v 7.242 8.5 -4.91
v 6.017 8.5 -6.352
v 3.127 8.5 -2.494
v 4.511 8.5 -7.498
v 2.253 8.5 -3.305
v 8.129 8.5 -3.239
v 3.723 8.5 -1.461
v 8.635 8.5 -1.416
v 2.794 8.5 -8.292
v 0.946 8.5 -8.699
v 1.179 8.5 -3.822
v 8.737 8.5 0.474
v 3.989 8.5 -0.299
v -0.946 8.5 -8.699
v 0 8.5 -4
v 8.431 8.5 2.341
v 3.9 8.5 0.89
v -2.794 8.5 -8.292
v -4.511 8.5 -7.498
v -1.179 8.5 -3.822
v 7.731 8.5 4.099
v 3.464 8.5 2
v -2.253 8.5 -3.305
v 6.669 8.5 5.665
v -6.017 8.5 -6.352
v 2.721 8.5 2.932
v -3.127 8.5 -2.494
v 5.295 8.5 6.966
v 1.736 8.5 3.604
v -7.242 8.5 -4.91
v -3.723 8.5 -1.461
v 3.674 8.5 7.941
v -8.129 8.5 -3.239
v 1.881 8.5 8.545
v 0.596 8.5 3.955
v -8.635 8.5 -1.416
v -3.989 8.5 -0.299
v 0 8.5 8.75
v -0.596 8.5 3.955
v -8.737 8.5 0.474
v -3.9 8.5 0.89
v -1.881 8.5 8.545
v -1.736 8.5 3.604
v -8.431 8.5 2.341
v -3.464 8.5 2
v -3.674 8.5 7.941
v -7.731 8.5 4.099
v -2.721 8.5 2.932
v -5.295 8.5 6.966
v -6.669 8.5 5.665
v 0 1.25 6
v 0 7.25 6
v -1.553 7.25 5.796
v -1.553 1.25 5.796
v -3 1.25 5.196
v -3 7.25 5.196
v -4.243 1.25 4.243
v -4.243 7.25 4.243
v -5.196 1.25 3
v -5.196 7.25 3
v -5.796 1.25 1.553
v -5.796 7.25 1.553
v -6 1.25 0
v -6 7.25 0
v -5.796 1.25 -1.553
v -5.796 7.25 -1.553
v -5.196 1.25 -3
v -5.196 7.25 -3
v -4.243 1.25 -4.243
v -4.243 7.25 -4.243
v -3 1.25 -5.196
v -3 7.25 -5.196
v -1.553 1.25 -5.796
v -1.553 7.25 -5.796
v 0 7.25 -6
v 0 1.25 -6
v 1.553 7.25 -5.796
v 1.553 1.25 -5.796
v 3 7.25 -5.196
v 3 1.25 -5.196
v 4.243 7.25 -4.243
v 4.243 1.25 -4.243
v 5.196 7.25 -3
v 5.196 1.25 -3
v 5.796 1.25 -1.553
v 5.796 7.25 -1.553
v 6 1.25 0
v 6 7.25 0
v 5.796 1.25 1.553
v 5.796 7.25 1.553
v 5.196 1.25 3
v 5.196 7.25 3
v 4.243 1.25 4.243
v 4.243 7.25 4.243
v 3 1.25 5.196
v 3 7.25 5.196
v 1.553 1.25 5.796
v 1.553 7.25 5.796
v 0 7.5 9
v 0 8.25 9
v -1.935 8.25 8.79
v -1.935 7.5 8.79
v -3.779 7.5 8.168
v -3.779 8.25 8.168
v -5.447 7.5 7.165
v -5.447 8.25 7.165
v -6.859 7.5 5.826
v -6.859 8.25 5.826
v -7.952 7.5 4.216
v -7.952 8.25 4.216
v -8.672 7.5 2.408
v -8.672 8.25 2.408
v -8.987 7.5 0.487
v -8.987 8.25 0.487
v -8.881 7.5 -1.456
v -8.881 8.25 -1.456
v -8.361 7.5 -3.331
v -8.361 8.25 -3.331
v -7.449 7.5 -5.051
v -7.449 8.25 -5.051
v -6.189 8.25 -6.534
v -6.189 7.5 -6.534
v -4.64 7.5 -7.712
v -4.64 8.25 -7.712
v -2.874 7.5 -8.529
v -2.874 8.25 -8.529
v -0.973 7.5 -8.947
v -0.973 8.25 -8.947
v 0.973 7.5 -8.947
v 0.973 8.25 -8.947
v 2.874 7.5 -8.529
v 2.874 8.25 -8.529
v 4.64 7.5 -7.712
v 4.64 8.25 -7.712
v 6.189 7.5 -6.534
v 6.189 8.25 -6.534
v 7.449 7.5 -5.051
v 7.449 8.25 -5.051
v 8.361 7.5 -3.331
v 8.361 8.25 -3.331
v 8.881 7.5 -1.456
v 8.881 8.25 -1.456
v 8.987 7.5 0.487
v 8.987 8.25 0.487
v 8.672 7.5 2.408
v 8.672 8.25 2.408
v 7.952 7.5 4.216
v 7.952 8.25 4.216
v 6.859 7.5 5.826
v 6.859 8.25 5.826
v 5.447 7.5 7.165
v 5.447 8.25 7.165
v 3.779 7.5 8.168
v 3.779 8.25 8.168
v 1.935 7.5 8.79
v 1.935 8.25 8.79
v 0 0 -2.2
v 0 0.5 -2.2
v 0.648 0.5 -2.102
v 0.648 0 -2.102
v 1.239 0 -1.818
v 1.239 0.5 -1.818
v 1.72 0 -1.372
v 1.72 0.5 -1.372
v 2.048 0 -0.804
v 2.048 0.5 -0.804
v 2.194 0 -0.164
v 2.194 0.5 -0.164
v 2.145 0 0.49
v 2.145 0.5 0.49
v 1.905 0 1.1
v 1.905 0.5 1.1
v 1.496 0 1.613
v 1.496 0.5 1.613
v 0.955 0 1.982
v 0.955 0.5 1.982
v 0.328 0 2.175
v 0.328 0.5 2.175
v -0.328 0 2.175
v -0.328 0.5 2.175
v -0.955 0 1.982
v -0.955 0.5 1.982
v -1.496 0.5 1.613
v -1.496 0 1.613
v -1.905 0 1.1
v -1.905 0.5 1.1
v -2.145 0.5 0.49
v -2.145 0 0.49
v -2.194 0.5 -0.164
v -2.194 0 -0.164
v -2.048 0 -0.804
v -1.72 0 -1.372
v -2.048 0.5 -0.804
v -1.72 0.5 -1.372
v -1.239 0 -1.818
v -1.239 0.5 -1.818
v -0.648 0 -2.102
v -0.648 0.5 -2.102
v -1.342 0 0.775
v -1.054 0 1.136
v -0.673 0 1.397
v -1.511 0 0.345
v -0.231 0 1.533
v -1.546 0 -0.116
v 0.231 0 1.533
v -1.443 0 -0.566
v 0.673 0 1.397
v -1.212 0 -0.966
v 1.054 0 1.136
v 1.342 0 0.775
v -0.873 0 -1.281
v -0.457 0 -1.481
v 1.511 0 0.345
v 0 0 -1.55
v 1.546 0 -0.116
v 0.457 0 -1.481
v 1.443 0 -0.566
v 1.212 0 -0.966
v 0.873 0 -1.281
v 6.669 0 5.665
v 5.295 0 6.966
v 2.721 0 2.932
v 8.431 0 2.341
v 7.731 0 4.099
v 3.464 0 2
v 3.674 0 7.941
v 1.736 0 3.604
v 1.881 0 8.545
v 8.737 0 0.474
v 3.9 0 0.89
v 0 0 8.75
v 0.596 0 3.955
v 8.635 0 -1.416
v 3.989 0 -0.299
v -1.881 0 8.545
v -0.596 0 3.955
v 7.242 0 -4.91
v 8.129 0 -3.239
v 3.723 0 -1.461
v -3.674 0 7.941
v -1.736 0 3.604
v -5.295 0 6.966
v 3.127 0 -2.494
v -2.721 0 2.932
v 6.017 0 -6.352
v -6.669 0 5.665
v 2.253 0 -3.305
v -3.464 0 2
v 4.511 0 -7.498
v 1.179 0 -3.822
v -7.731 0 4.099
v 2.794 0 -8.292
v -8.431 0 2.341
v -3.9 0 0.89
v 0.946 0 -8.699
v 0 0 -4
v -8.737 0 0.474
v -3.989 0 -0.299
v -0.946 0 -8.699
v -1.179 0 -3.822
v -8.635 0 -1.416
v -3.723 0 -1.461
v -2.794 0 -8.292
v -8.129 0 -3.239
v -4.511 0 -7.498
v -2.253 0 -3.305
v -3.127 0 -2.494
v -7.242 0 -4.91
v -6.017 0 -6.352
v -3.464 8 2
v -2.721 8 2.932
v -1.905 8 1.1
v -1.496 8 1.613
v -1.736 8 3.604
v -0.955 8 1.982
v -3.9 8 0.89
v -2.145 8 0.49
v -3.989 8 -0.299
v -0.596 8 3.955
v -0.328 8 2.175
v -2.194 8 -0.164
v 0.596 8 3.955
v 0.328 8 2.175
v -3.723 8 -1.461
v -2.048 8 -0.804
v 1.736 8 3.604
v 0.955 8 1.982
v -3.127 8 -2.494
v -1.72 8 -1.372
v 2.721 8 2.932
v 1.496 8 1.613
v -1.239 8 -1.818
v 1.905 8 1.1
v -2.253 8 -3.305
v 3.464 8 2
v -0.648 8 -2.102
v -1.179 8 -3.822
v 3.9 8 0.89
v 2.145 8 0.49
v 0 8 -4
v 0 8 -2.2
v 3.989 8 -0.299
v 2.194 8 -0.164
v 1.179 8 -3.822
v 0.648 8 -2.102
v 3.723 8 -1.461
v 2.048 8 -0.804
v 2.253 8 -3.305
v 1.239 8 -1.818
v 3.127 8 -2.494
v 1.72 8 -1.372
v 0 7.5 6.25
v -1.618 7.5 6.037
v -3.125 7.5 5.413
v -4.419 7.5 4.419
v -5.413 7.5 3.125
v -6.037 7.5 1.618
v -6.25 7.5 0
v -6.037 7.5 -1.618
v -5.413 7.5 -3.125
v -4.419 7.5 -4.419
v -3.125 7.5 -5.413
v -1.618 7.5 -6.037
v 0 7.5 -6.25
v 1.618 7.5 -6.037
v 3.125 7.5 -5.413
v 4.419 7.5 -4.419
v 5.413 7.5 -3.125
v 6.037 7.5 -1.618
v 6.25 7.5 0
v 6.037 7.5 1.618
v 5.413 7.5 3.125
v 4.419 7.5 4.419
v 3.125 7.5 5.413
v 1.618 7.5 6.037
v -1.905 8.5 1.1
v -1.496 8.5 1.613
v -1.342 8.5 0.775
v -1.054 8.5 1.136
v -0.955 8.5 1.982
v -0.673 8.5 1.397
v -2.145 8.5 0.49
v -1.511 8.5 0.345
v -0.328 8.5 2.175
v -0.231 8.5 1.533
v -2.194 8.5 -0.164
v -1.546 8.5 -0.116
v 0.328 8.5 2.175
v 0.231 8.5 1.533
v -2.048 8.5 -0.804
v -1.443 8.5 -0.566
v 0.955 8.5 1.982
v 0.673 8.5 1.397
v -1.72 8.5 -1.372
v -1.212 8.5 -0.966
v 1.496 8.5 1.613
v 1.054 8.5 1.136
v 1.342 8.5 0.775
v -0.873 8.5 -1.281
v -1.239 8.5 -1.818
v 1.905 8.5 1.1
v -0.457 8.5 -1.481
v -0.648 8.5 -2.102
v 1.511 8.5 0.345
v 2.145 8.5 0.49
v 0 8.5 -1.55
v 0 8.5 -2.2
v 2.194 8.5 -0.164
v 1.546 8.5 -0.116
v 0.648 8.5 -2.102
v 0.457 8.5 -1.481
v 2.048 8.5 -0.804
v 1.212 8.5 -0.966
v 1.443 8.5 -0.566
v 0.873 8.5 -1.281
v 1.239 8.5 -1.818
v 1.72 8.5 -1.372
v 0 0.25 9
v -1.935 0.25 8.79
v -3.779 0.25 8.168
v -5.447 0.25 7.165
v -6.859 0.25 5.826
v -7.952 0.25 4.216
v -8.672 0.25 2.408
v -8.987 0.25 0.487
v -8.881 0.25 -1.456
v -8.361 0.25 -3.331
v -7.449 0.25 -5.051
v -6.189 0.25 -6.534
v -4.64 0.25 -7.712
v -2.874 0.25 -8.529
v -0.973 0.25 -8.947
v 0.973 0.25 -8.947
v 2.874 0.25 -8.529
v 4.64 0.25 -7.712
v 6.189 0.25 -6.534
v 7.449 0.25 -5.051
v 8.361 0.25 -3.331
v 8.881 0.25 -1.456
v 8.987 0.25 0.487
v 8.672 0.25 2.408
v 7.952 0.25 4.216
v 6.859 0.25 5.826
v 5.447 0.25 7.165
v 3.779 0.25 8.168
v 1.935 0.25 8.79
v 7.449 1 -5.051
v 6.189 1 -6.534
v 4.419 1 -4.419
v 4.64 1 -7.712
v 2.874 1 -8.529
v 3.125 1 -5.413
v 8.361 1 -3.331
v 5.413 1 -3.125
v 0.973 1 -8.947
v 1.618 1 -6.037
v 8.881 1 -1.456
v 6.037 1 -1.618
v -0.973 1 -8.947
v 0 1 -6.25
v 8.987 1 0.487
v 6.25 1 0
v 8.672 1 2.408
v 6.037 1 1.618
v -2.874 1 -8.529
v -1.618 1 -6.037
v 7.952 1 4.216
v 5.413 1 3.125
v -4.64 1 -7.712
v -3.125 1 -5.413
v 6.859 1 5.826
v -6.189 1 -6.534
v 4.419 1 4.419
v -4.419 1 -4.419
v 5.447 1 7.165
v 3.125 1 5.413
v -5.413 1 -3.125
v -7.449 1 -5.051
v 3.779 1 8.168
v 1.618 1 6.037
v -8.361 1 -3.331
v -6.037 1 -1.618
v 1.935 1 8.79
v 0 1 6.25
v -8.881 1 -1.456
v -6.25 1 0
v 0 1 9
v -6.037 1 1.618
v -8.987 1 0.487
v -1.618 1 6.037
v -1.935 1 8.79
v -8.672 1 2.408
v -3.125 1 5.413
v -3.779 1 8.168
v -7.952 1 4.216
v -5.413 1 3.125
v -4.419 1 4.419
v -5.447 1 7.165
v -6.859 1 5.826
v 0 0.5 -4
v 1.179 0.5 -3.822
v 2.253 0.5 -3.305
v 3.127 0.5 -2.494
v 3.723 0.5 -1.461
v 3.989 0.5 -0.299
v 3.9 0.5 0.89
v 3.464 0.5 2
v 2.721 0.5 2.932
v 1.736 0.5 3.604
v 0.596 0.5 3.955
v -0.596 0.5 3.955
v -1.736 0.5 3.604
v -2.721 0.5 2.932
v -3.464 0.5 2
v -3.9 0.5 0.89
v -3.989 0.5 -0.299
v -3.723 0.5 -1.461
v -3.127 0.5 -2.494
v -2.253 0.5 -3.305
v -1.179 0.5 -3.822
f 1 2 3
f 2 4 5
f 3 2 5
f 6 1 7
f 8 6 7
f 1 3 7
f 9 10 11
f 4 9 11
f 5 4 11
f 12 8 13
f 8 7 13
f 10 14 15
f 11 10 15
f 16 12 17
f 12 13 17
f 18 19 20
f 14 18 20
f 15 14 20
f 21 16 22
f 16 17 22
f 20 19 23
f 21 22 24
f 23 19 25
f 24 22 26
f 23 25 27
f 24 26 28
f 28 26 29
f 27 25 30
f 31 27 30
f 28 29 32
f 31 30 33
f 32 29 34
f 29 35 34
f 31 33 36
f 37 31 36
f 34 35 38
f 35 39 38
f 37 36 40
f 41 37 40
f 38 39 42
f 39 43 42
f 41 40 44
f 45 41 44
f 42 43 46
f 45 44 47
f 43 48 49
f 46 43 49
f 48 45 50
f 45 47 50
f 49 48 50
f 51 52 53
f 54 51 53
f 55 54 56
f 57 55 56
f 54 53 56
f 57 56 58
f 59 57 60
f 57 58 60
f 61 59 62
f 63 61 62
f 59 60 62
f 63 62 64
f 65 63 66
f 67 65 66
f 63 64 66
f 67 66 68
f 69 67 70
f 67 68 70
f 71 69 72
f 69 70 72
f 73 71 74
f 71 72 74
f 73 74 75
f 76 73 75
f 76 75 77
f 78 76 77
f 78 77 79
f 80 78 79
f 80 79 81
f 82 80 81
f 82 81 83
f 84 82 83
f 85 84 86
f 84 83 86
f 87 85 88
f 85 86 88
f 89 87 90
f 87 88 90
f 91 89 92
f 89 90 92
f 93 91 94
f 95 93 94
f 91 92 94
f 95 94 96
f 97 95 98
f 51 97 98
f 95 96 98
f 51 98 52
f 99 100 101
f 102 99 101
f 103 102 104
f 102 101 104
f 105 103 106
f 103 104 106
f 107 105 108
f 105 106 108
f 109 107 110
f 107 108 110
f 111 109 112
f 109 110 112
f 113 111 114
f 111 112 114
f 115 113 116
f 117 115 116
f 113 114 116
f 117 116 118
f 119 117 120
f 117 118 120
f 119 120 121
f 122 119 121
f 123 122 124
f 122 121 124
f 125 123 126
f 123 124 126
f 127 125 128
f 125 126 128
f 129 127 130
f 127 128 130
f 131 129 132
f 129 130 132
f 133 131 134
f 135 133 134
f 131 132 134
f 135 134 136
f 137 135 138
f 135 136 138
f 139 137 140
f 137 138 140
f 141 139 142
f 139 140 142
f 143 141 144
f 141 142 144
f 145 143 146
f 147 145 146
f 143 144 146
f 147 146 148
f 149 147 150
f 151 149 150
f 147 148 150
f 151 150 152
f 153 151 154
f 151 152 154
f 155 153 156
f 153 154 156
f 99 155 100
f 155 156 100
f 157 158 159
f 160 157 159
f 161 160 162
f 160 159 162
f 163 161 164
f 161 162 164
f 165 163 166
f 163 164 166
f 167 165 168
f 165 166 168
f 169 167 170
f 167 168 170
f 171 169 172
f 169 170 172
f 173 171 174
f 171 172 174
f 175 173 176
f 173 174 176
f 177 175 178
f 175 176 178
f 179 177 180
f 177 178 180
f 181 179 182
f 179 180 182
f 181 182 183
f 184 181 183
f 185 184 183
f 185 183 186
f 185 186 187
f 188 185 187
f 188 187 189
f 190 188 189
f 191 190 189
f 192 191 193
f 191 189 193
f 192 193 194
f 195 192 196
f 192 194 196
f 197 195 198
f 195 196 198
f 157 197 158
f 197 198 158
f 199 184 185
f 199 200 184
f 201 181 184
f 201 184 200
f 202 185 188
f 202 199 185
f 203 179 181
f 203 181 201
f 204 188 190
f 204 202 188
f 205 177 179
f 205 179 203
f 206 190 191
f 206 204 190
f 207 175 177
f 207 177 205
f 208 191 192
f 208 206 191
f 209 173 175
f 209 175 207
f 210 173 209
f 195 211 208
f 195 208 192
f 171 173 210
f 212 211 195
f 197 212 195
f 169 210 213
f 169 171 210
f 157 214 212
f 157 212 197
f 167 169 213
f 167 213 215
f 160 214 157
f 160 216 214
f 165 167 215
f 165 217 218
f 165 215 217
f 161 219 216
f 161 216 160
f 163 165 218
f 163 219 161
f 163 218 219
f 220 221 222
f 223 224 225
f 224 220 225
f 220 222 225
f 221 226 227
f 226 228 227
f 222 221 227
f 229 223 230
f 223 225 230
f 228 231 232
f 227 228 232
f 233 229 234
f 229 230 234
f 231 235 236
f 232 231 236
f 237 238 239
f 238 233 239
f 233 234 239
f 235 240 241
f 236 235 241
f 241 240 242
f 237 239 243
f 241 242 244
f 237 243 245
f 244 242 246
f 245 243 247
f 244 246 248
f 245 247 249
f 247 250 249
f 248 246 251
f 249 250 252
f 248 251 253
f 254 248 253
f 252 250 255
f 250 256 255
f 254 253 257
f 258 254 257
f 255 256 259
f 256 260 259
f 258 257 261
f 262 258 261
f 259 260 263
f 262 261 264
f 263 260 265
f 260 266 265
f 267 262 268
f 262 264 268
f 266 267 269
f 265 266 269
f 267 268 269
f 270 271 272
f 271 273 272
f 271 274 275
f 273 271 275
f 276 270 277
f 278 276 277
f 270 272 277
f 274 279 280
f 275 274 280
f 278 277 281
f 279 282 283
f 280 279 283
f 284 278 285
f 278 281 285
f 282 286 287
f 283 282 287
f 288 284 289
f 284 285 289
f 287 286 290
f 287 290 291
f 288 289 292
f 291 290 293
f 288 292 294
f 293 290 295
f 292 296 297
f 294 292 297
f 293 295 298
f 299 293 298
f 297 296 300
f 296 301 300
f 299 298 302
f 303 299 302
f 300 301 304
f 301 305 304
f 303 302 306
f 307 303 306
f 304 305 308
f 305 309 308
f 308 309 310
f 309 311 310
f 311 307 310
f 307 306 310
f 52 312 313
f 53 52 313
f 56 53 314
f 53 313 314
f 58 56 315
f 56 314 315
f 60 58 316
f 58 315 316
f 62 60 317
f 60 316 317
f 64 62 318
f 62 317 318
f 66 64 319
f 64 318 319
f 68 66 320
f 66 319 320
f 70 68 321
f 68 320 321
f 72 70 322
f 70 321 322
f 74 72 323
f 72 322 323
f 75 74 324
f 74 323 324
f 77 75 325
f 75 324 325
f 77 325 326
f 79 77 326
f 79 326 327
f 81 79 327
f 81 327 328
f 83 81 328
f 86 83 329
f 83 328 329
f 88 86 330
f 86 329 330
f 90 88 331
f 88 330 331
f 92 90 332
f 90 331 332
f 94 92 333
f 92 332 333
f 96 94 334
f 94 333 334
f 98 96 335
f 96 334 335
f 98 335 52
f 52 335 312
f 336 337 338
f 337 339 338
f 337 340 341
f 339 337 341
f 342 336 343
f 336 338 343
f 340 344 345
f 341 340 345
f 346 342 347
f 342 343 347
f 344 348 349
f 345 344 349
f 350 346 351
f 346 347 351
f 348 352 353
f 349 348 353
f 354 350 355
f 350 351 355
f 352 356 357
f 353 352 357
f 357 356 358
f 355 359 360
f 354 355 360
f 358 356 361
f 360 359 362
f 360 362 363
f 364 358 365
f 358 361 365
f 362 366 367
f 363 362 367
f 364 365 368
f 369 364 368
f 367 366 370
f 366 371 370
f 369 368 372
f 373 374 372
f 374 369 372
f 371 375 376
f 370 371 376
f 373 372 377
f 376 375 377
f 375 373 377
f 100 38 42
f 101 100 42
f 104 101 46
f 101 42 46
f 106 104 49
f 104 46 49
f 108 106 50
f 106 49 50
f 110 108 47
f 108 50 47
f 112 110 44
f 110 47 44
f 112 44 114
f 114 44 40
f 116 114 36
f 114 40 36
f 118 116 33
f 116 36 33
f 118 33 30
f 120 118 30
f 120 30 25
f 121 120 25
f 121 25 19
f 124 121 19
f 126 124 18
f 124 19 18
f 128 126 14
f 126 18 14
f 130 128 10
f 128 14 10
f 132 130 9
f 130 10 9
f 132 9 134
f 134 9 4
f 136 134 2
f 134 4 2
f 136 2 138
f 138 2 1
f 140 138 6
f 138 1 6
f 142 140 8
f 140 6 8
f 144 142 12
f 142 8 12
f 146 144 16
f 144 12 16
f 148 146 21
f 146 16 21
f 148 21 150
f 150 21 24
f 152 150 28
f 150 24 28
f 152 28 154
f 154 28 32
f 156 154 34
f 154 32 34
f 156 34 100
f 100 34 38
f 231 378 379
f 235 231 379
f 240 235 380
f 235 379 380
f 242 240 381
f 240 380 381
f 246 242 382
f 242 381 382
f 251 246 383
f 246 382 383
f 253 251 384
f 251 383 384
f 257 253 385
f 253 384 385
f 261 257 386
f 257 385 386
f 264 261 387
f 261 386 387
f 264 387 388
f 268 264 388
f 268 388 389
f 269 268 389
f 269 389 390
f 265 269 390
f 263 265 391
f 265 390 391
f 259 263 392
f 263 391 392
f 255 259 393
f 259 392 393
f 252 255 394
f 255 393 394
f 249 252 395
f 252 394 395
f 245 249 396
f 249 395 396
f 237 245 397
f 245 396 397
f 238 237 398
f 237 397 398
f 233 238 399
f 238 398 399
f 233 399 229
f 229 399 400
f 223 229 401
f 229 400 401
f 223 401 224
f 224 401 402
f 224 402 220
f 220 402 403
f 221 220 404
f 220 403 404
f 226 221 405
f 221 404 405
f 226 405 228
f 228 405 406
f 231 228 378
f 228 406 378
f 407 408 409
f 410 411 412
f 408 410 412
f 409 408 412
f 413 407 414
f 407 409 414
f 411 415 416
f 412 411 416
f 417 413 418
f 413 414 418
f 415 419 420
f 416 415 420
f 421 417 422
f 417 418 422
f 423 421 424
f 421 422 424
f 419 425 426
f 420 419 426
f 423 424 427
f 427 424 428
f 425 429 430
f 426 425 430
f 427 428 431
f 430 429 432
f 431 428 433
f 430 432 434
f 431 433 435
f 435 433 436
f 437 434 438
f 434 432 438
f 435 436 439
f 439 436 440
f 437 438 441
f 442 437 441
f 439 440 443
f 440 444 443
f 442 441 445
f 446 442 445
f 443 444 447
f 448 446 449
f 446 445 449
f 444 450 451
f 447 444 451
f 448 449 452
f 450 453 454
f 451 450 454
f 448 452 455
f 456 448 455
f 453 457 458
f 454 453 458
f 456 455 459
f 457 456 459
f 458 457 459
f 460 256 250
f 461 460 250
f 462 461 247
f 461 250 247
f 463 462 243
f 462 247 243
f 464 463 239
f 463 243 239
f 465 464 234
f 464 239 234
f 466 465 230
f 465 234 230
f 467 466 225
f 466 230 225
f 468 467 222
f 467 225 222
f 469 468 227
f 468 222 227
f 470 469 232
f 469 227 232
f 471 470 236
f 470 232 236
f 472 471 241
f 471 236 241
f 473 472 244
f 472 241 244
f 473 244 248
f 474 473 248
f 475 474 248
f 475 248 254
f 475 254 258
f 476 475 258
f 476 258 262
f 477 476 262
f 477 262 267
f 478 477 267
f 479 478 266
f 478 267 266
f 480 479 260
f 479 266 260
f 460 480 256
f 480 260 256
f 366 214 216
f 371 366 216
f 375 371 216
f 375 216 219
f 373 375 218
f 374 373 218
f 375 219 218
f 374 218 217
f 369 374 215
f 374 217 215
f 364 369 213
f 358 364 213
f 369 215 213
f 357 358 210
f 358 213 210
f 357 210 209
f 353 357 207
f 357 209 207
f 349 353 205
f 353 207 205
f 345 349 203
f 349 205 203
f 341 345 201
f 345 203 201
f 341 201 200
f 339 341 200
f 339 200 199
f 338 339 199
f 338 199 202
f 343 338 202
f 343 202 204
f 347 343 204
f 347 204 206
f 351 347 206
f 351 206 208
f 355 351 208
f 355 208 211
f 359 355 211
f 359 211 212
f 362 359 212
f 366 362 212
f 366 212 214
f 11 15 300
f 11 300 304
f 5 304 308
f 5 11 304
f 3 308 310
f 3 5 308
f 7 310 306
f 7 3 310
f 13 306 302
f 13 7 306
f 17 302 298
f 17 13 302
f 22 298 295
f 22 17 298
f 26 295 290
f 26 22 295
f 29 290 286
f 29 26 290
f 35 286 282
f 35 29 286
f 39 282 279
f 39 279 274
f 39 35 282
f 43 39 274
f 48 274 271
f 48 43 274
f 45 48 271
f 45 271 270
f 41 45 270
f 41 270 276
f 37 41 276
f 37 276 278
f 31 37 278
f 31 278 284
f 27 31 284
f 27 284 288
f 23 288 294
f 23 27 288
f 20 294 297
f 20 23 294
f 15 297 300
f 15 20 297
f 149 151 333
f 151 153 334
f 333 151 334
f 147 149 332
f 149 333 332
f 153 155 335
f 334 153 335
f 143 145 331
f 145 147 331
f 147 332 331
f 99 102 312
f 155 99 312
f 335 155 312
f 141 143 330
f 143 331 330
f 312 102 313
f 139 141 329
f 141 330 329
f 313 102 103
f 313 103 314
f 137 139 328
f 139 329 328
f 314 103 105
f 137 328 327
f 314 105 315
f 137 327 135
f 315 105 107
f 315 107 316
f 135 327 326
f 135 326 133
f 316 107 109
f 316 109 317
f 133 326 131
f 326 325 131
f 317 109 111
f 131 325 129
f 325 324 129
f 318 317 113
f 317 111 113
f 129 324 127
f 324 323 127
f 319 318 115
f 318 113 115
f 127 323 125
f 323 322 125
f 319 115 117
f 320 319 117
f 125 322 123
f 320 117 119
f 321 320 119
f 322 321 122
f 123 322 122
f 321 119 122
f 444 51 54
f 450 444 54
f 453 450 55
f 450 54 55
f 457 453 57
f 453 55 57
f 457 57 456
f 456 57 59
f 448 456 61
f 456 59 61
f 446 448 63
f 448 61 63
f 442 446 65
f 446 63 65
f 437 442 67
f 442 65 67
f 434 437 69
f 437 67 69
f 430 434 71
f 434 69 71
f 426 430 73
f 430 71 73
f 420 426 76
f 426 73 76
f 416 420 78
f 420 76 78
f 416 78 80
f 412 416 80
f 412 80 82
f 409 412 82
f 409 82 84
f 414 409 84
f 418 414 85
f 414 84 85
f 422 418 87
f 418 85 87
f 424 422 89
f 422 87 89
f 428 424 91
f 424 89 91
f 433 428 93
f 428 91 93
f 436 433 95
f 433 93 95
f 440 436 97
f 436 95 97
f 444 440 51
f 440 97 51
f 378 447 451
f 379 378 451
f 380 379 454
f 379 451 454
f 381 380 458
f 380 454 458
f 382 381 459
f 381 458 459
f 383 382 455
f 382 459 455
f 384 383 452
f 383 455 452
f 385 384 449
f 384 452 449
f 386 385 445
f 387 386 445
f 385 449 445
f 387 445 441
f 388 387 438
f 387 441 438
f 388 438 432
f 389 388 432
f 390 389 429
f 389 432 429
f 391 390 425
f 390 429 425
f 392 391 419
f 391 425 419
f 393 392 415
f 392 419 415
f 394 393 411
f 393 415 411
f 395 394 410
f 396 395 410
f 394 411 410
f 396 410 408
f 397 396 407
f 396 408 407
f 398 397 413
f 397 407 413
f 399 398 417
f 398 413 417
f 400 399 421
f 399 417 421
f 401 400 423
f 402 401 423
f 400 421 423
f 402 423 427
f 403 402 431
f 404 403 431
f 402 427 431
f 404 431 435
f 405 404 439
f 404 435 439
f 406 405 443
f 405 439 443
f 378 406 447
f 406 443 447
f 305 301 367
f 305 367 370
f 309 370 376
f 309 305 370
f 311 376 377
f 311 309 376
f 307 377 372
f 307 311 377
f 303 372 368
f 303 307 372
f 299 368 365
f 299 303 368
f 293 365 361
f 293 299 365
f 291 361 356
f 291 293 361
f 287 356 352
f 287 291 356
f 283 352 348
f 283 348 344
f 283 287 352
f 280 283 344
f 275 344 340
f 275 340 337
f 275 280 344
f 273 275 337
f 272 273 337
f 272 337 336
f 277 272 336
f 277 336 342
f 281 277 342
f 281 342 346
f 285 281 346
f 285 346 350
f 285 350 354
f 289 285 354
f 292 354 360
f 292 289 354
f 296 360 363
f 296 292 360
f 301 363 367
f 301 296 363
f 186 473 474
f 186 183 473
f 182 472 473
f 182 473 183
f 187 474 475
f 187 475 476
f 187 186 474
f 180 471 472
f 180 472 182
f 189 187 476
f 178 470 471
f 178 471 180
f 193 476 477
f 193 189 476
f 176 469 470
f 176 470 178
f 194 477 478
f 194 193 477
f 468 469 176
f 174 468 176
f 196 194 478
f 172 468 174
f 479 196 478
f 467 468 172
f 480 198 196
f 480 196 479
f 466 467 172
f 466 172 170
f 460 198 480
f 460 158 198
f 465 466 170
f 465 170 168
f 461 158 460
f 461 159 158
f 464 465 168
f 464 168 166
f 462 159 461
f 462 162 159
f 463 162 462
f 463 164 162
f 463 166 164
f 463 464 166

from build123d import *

# Parameters (mm, degrees)
SKETCH2_R           = 4
CUT_EXTRUDE1_DEPTH  = 0.5
SKETCH3_R           = 2.2
BOSS_EXTRUDE1_DEPTH = 0.5
SKETCH4_R           = 1.55
CUT_EXTRUDE2_DEPTH  = 16.305227865
CHAMFER1_SIZE       = 0.25


with BuildPart() as part:
    # Sketch1 → Revolve1 (revolve)
    with BuildSketch(Plane.XY, mode=Mode.PRIVATE) as revolve1_sk:
        Polygon((0, 0), (-9, 0), (-9, 1), (-6, 1), (-6, 7.5), (-9, 7.5), (-9, 8.5), (0, 8.5), align=None)
    revolve(revolve1_sk.sketch.rotate(Axis((0, 8.5, 0), (0, -1, 0)), 270), axis=Axis((0, 8.5, 0), (0, -1, 0)))

    # Sketch2 → Cut-Extrude1 (cut)
    with BuildSketch(Plane.XZ):
        with Locations(Location((0, 0, 0), (0, 0, 270))):
            Circle(SKETCH2_R)
    cut_extrude1 = extrude(amount=-CUT_EXTRUDE1_DEPTH, mode=Mode.SUBTRACT)

    # Sketch3 → Boss-Extrude1 (add)
    with BuildSketch(Plane.XZ.offset(-0.5)):
        with Locations(Location((0, 0, 0), (0, 0, 270))):
            Circle(SKETCH3_R)
    boss_extrude1 = extrude(amount=BOSS_EXTRUDE1_DEPTH)

    # Mirror1: Cut-Extrude1, Boss-Extrude1 across plane
    add(cut_extrude1.mirror(Plane.ZX.offset(4.25)), mode=Mode.SUBTRACT)
    add(boss_extrude1.mirror(Plane.ZX.offset(4.25)))

    # Sketch4 → Cut-Extrude2 (cut, through all)
    with BuildSketch(Plane.XZ):
        with Locations(Location((0, 0, 0), (0, 0, 270))):
            Circle(SKETCH4_R)
    extrude(amount=-CUT_EXTRUDE2_DEPTH, mode=Mode.SUBTRACT)

    # Chamfer1
    chamfer1_edges = [part.edges().sort_by_distance(p)[0] for p in [
        (0, 8.5, -9),
        (0, 7.5, -6),
        (0, 1, -6),
        (0, 0, -9),
    ]]
    chamfer(chamfer1_edges, length=CHAMFER1_SIZE)


solid = part.part
